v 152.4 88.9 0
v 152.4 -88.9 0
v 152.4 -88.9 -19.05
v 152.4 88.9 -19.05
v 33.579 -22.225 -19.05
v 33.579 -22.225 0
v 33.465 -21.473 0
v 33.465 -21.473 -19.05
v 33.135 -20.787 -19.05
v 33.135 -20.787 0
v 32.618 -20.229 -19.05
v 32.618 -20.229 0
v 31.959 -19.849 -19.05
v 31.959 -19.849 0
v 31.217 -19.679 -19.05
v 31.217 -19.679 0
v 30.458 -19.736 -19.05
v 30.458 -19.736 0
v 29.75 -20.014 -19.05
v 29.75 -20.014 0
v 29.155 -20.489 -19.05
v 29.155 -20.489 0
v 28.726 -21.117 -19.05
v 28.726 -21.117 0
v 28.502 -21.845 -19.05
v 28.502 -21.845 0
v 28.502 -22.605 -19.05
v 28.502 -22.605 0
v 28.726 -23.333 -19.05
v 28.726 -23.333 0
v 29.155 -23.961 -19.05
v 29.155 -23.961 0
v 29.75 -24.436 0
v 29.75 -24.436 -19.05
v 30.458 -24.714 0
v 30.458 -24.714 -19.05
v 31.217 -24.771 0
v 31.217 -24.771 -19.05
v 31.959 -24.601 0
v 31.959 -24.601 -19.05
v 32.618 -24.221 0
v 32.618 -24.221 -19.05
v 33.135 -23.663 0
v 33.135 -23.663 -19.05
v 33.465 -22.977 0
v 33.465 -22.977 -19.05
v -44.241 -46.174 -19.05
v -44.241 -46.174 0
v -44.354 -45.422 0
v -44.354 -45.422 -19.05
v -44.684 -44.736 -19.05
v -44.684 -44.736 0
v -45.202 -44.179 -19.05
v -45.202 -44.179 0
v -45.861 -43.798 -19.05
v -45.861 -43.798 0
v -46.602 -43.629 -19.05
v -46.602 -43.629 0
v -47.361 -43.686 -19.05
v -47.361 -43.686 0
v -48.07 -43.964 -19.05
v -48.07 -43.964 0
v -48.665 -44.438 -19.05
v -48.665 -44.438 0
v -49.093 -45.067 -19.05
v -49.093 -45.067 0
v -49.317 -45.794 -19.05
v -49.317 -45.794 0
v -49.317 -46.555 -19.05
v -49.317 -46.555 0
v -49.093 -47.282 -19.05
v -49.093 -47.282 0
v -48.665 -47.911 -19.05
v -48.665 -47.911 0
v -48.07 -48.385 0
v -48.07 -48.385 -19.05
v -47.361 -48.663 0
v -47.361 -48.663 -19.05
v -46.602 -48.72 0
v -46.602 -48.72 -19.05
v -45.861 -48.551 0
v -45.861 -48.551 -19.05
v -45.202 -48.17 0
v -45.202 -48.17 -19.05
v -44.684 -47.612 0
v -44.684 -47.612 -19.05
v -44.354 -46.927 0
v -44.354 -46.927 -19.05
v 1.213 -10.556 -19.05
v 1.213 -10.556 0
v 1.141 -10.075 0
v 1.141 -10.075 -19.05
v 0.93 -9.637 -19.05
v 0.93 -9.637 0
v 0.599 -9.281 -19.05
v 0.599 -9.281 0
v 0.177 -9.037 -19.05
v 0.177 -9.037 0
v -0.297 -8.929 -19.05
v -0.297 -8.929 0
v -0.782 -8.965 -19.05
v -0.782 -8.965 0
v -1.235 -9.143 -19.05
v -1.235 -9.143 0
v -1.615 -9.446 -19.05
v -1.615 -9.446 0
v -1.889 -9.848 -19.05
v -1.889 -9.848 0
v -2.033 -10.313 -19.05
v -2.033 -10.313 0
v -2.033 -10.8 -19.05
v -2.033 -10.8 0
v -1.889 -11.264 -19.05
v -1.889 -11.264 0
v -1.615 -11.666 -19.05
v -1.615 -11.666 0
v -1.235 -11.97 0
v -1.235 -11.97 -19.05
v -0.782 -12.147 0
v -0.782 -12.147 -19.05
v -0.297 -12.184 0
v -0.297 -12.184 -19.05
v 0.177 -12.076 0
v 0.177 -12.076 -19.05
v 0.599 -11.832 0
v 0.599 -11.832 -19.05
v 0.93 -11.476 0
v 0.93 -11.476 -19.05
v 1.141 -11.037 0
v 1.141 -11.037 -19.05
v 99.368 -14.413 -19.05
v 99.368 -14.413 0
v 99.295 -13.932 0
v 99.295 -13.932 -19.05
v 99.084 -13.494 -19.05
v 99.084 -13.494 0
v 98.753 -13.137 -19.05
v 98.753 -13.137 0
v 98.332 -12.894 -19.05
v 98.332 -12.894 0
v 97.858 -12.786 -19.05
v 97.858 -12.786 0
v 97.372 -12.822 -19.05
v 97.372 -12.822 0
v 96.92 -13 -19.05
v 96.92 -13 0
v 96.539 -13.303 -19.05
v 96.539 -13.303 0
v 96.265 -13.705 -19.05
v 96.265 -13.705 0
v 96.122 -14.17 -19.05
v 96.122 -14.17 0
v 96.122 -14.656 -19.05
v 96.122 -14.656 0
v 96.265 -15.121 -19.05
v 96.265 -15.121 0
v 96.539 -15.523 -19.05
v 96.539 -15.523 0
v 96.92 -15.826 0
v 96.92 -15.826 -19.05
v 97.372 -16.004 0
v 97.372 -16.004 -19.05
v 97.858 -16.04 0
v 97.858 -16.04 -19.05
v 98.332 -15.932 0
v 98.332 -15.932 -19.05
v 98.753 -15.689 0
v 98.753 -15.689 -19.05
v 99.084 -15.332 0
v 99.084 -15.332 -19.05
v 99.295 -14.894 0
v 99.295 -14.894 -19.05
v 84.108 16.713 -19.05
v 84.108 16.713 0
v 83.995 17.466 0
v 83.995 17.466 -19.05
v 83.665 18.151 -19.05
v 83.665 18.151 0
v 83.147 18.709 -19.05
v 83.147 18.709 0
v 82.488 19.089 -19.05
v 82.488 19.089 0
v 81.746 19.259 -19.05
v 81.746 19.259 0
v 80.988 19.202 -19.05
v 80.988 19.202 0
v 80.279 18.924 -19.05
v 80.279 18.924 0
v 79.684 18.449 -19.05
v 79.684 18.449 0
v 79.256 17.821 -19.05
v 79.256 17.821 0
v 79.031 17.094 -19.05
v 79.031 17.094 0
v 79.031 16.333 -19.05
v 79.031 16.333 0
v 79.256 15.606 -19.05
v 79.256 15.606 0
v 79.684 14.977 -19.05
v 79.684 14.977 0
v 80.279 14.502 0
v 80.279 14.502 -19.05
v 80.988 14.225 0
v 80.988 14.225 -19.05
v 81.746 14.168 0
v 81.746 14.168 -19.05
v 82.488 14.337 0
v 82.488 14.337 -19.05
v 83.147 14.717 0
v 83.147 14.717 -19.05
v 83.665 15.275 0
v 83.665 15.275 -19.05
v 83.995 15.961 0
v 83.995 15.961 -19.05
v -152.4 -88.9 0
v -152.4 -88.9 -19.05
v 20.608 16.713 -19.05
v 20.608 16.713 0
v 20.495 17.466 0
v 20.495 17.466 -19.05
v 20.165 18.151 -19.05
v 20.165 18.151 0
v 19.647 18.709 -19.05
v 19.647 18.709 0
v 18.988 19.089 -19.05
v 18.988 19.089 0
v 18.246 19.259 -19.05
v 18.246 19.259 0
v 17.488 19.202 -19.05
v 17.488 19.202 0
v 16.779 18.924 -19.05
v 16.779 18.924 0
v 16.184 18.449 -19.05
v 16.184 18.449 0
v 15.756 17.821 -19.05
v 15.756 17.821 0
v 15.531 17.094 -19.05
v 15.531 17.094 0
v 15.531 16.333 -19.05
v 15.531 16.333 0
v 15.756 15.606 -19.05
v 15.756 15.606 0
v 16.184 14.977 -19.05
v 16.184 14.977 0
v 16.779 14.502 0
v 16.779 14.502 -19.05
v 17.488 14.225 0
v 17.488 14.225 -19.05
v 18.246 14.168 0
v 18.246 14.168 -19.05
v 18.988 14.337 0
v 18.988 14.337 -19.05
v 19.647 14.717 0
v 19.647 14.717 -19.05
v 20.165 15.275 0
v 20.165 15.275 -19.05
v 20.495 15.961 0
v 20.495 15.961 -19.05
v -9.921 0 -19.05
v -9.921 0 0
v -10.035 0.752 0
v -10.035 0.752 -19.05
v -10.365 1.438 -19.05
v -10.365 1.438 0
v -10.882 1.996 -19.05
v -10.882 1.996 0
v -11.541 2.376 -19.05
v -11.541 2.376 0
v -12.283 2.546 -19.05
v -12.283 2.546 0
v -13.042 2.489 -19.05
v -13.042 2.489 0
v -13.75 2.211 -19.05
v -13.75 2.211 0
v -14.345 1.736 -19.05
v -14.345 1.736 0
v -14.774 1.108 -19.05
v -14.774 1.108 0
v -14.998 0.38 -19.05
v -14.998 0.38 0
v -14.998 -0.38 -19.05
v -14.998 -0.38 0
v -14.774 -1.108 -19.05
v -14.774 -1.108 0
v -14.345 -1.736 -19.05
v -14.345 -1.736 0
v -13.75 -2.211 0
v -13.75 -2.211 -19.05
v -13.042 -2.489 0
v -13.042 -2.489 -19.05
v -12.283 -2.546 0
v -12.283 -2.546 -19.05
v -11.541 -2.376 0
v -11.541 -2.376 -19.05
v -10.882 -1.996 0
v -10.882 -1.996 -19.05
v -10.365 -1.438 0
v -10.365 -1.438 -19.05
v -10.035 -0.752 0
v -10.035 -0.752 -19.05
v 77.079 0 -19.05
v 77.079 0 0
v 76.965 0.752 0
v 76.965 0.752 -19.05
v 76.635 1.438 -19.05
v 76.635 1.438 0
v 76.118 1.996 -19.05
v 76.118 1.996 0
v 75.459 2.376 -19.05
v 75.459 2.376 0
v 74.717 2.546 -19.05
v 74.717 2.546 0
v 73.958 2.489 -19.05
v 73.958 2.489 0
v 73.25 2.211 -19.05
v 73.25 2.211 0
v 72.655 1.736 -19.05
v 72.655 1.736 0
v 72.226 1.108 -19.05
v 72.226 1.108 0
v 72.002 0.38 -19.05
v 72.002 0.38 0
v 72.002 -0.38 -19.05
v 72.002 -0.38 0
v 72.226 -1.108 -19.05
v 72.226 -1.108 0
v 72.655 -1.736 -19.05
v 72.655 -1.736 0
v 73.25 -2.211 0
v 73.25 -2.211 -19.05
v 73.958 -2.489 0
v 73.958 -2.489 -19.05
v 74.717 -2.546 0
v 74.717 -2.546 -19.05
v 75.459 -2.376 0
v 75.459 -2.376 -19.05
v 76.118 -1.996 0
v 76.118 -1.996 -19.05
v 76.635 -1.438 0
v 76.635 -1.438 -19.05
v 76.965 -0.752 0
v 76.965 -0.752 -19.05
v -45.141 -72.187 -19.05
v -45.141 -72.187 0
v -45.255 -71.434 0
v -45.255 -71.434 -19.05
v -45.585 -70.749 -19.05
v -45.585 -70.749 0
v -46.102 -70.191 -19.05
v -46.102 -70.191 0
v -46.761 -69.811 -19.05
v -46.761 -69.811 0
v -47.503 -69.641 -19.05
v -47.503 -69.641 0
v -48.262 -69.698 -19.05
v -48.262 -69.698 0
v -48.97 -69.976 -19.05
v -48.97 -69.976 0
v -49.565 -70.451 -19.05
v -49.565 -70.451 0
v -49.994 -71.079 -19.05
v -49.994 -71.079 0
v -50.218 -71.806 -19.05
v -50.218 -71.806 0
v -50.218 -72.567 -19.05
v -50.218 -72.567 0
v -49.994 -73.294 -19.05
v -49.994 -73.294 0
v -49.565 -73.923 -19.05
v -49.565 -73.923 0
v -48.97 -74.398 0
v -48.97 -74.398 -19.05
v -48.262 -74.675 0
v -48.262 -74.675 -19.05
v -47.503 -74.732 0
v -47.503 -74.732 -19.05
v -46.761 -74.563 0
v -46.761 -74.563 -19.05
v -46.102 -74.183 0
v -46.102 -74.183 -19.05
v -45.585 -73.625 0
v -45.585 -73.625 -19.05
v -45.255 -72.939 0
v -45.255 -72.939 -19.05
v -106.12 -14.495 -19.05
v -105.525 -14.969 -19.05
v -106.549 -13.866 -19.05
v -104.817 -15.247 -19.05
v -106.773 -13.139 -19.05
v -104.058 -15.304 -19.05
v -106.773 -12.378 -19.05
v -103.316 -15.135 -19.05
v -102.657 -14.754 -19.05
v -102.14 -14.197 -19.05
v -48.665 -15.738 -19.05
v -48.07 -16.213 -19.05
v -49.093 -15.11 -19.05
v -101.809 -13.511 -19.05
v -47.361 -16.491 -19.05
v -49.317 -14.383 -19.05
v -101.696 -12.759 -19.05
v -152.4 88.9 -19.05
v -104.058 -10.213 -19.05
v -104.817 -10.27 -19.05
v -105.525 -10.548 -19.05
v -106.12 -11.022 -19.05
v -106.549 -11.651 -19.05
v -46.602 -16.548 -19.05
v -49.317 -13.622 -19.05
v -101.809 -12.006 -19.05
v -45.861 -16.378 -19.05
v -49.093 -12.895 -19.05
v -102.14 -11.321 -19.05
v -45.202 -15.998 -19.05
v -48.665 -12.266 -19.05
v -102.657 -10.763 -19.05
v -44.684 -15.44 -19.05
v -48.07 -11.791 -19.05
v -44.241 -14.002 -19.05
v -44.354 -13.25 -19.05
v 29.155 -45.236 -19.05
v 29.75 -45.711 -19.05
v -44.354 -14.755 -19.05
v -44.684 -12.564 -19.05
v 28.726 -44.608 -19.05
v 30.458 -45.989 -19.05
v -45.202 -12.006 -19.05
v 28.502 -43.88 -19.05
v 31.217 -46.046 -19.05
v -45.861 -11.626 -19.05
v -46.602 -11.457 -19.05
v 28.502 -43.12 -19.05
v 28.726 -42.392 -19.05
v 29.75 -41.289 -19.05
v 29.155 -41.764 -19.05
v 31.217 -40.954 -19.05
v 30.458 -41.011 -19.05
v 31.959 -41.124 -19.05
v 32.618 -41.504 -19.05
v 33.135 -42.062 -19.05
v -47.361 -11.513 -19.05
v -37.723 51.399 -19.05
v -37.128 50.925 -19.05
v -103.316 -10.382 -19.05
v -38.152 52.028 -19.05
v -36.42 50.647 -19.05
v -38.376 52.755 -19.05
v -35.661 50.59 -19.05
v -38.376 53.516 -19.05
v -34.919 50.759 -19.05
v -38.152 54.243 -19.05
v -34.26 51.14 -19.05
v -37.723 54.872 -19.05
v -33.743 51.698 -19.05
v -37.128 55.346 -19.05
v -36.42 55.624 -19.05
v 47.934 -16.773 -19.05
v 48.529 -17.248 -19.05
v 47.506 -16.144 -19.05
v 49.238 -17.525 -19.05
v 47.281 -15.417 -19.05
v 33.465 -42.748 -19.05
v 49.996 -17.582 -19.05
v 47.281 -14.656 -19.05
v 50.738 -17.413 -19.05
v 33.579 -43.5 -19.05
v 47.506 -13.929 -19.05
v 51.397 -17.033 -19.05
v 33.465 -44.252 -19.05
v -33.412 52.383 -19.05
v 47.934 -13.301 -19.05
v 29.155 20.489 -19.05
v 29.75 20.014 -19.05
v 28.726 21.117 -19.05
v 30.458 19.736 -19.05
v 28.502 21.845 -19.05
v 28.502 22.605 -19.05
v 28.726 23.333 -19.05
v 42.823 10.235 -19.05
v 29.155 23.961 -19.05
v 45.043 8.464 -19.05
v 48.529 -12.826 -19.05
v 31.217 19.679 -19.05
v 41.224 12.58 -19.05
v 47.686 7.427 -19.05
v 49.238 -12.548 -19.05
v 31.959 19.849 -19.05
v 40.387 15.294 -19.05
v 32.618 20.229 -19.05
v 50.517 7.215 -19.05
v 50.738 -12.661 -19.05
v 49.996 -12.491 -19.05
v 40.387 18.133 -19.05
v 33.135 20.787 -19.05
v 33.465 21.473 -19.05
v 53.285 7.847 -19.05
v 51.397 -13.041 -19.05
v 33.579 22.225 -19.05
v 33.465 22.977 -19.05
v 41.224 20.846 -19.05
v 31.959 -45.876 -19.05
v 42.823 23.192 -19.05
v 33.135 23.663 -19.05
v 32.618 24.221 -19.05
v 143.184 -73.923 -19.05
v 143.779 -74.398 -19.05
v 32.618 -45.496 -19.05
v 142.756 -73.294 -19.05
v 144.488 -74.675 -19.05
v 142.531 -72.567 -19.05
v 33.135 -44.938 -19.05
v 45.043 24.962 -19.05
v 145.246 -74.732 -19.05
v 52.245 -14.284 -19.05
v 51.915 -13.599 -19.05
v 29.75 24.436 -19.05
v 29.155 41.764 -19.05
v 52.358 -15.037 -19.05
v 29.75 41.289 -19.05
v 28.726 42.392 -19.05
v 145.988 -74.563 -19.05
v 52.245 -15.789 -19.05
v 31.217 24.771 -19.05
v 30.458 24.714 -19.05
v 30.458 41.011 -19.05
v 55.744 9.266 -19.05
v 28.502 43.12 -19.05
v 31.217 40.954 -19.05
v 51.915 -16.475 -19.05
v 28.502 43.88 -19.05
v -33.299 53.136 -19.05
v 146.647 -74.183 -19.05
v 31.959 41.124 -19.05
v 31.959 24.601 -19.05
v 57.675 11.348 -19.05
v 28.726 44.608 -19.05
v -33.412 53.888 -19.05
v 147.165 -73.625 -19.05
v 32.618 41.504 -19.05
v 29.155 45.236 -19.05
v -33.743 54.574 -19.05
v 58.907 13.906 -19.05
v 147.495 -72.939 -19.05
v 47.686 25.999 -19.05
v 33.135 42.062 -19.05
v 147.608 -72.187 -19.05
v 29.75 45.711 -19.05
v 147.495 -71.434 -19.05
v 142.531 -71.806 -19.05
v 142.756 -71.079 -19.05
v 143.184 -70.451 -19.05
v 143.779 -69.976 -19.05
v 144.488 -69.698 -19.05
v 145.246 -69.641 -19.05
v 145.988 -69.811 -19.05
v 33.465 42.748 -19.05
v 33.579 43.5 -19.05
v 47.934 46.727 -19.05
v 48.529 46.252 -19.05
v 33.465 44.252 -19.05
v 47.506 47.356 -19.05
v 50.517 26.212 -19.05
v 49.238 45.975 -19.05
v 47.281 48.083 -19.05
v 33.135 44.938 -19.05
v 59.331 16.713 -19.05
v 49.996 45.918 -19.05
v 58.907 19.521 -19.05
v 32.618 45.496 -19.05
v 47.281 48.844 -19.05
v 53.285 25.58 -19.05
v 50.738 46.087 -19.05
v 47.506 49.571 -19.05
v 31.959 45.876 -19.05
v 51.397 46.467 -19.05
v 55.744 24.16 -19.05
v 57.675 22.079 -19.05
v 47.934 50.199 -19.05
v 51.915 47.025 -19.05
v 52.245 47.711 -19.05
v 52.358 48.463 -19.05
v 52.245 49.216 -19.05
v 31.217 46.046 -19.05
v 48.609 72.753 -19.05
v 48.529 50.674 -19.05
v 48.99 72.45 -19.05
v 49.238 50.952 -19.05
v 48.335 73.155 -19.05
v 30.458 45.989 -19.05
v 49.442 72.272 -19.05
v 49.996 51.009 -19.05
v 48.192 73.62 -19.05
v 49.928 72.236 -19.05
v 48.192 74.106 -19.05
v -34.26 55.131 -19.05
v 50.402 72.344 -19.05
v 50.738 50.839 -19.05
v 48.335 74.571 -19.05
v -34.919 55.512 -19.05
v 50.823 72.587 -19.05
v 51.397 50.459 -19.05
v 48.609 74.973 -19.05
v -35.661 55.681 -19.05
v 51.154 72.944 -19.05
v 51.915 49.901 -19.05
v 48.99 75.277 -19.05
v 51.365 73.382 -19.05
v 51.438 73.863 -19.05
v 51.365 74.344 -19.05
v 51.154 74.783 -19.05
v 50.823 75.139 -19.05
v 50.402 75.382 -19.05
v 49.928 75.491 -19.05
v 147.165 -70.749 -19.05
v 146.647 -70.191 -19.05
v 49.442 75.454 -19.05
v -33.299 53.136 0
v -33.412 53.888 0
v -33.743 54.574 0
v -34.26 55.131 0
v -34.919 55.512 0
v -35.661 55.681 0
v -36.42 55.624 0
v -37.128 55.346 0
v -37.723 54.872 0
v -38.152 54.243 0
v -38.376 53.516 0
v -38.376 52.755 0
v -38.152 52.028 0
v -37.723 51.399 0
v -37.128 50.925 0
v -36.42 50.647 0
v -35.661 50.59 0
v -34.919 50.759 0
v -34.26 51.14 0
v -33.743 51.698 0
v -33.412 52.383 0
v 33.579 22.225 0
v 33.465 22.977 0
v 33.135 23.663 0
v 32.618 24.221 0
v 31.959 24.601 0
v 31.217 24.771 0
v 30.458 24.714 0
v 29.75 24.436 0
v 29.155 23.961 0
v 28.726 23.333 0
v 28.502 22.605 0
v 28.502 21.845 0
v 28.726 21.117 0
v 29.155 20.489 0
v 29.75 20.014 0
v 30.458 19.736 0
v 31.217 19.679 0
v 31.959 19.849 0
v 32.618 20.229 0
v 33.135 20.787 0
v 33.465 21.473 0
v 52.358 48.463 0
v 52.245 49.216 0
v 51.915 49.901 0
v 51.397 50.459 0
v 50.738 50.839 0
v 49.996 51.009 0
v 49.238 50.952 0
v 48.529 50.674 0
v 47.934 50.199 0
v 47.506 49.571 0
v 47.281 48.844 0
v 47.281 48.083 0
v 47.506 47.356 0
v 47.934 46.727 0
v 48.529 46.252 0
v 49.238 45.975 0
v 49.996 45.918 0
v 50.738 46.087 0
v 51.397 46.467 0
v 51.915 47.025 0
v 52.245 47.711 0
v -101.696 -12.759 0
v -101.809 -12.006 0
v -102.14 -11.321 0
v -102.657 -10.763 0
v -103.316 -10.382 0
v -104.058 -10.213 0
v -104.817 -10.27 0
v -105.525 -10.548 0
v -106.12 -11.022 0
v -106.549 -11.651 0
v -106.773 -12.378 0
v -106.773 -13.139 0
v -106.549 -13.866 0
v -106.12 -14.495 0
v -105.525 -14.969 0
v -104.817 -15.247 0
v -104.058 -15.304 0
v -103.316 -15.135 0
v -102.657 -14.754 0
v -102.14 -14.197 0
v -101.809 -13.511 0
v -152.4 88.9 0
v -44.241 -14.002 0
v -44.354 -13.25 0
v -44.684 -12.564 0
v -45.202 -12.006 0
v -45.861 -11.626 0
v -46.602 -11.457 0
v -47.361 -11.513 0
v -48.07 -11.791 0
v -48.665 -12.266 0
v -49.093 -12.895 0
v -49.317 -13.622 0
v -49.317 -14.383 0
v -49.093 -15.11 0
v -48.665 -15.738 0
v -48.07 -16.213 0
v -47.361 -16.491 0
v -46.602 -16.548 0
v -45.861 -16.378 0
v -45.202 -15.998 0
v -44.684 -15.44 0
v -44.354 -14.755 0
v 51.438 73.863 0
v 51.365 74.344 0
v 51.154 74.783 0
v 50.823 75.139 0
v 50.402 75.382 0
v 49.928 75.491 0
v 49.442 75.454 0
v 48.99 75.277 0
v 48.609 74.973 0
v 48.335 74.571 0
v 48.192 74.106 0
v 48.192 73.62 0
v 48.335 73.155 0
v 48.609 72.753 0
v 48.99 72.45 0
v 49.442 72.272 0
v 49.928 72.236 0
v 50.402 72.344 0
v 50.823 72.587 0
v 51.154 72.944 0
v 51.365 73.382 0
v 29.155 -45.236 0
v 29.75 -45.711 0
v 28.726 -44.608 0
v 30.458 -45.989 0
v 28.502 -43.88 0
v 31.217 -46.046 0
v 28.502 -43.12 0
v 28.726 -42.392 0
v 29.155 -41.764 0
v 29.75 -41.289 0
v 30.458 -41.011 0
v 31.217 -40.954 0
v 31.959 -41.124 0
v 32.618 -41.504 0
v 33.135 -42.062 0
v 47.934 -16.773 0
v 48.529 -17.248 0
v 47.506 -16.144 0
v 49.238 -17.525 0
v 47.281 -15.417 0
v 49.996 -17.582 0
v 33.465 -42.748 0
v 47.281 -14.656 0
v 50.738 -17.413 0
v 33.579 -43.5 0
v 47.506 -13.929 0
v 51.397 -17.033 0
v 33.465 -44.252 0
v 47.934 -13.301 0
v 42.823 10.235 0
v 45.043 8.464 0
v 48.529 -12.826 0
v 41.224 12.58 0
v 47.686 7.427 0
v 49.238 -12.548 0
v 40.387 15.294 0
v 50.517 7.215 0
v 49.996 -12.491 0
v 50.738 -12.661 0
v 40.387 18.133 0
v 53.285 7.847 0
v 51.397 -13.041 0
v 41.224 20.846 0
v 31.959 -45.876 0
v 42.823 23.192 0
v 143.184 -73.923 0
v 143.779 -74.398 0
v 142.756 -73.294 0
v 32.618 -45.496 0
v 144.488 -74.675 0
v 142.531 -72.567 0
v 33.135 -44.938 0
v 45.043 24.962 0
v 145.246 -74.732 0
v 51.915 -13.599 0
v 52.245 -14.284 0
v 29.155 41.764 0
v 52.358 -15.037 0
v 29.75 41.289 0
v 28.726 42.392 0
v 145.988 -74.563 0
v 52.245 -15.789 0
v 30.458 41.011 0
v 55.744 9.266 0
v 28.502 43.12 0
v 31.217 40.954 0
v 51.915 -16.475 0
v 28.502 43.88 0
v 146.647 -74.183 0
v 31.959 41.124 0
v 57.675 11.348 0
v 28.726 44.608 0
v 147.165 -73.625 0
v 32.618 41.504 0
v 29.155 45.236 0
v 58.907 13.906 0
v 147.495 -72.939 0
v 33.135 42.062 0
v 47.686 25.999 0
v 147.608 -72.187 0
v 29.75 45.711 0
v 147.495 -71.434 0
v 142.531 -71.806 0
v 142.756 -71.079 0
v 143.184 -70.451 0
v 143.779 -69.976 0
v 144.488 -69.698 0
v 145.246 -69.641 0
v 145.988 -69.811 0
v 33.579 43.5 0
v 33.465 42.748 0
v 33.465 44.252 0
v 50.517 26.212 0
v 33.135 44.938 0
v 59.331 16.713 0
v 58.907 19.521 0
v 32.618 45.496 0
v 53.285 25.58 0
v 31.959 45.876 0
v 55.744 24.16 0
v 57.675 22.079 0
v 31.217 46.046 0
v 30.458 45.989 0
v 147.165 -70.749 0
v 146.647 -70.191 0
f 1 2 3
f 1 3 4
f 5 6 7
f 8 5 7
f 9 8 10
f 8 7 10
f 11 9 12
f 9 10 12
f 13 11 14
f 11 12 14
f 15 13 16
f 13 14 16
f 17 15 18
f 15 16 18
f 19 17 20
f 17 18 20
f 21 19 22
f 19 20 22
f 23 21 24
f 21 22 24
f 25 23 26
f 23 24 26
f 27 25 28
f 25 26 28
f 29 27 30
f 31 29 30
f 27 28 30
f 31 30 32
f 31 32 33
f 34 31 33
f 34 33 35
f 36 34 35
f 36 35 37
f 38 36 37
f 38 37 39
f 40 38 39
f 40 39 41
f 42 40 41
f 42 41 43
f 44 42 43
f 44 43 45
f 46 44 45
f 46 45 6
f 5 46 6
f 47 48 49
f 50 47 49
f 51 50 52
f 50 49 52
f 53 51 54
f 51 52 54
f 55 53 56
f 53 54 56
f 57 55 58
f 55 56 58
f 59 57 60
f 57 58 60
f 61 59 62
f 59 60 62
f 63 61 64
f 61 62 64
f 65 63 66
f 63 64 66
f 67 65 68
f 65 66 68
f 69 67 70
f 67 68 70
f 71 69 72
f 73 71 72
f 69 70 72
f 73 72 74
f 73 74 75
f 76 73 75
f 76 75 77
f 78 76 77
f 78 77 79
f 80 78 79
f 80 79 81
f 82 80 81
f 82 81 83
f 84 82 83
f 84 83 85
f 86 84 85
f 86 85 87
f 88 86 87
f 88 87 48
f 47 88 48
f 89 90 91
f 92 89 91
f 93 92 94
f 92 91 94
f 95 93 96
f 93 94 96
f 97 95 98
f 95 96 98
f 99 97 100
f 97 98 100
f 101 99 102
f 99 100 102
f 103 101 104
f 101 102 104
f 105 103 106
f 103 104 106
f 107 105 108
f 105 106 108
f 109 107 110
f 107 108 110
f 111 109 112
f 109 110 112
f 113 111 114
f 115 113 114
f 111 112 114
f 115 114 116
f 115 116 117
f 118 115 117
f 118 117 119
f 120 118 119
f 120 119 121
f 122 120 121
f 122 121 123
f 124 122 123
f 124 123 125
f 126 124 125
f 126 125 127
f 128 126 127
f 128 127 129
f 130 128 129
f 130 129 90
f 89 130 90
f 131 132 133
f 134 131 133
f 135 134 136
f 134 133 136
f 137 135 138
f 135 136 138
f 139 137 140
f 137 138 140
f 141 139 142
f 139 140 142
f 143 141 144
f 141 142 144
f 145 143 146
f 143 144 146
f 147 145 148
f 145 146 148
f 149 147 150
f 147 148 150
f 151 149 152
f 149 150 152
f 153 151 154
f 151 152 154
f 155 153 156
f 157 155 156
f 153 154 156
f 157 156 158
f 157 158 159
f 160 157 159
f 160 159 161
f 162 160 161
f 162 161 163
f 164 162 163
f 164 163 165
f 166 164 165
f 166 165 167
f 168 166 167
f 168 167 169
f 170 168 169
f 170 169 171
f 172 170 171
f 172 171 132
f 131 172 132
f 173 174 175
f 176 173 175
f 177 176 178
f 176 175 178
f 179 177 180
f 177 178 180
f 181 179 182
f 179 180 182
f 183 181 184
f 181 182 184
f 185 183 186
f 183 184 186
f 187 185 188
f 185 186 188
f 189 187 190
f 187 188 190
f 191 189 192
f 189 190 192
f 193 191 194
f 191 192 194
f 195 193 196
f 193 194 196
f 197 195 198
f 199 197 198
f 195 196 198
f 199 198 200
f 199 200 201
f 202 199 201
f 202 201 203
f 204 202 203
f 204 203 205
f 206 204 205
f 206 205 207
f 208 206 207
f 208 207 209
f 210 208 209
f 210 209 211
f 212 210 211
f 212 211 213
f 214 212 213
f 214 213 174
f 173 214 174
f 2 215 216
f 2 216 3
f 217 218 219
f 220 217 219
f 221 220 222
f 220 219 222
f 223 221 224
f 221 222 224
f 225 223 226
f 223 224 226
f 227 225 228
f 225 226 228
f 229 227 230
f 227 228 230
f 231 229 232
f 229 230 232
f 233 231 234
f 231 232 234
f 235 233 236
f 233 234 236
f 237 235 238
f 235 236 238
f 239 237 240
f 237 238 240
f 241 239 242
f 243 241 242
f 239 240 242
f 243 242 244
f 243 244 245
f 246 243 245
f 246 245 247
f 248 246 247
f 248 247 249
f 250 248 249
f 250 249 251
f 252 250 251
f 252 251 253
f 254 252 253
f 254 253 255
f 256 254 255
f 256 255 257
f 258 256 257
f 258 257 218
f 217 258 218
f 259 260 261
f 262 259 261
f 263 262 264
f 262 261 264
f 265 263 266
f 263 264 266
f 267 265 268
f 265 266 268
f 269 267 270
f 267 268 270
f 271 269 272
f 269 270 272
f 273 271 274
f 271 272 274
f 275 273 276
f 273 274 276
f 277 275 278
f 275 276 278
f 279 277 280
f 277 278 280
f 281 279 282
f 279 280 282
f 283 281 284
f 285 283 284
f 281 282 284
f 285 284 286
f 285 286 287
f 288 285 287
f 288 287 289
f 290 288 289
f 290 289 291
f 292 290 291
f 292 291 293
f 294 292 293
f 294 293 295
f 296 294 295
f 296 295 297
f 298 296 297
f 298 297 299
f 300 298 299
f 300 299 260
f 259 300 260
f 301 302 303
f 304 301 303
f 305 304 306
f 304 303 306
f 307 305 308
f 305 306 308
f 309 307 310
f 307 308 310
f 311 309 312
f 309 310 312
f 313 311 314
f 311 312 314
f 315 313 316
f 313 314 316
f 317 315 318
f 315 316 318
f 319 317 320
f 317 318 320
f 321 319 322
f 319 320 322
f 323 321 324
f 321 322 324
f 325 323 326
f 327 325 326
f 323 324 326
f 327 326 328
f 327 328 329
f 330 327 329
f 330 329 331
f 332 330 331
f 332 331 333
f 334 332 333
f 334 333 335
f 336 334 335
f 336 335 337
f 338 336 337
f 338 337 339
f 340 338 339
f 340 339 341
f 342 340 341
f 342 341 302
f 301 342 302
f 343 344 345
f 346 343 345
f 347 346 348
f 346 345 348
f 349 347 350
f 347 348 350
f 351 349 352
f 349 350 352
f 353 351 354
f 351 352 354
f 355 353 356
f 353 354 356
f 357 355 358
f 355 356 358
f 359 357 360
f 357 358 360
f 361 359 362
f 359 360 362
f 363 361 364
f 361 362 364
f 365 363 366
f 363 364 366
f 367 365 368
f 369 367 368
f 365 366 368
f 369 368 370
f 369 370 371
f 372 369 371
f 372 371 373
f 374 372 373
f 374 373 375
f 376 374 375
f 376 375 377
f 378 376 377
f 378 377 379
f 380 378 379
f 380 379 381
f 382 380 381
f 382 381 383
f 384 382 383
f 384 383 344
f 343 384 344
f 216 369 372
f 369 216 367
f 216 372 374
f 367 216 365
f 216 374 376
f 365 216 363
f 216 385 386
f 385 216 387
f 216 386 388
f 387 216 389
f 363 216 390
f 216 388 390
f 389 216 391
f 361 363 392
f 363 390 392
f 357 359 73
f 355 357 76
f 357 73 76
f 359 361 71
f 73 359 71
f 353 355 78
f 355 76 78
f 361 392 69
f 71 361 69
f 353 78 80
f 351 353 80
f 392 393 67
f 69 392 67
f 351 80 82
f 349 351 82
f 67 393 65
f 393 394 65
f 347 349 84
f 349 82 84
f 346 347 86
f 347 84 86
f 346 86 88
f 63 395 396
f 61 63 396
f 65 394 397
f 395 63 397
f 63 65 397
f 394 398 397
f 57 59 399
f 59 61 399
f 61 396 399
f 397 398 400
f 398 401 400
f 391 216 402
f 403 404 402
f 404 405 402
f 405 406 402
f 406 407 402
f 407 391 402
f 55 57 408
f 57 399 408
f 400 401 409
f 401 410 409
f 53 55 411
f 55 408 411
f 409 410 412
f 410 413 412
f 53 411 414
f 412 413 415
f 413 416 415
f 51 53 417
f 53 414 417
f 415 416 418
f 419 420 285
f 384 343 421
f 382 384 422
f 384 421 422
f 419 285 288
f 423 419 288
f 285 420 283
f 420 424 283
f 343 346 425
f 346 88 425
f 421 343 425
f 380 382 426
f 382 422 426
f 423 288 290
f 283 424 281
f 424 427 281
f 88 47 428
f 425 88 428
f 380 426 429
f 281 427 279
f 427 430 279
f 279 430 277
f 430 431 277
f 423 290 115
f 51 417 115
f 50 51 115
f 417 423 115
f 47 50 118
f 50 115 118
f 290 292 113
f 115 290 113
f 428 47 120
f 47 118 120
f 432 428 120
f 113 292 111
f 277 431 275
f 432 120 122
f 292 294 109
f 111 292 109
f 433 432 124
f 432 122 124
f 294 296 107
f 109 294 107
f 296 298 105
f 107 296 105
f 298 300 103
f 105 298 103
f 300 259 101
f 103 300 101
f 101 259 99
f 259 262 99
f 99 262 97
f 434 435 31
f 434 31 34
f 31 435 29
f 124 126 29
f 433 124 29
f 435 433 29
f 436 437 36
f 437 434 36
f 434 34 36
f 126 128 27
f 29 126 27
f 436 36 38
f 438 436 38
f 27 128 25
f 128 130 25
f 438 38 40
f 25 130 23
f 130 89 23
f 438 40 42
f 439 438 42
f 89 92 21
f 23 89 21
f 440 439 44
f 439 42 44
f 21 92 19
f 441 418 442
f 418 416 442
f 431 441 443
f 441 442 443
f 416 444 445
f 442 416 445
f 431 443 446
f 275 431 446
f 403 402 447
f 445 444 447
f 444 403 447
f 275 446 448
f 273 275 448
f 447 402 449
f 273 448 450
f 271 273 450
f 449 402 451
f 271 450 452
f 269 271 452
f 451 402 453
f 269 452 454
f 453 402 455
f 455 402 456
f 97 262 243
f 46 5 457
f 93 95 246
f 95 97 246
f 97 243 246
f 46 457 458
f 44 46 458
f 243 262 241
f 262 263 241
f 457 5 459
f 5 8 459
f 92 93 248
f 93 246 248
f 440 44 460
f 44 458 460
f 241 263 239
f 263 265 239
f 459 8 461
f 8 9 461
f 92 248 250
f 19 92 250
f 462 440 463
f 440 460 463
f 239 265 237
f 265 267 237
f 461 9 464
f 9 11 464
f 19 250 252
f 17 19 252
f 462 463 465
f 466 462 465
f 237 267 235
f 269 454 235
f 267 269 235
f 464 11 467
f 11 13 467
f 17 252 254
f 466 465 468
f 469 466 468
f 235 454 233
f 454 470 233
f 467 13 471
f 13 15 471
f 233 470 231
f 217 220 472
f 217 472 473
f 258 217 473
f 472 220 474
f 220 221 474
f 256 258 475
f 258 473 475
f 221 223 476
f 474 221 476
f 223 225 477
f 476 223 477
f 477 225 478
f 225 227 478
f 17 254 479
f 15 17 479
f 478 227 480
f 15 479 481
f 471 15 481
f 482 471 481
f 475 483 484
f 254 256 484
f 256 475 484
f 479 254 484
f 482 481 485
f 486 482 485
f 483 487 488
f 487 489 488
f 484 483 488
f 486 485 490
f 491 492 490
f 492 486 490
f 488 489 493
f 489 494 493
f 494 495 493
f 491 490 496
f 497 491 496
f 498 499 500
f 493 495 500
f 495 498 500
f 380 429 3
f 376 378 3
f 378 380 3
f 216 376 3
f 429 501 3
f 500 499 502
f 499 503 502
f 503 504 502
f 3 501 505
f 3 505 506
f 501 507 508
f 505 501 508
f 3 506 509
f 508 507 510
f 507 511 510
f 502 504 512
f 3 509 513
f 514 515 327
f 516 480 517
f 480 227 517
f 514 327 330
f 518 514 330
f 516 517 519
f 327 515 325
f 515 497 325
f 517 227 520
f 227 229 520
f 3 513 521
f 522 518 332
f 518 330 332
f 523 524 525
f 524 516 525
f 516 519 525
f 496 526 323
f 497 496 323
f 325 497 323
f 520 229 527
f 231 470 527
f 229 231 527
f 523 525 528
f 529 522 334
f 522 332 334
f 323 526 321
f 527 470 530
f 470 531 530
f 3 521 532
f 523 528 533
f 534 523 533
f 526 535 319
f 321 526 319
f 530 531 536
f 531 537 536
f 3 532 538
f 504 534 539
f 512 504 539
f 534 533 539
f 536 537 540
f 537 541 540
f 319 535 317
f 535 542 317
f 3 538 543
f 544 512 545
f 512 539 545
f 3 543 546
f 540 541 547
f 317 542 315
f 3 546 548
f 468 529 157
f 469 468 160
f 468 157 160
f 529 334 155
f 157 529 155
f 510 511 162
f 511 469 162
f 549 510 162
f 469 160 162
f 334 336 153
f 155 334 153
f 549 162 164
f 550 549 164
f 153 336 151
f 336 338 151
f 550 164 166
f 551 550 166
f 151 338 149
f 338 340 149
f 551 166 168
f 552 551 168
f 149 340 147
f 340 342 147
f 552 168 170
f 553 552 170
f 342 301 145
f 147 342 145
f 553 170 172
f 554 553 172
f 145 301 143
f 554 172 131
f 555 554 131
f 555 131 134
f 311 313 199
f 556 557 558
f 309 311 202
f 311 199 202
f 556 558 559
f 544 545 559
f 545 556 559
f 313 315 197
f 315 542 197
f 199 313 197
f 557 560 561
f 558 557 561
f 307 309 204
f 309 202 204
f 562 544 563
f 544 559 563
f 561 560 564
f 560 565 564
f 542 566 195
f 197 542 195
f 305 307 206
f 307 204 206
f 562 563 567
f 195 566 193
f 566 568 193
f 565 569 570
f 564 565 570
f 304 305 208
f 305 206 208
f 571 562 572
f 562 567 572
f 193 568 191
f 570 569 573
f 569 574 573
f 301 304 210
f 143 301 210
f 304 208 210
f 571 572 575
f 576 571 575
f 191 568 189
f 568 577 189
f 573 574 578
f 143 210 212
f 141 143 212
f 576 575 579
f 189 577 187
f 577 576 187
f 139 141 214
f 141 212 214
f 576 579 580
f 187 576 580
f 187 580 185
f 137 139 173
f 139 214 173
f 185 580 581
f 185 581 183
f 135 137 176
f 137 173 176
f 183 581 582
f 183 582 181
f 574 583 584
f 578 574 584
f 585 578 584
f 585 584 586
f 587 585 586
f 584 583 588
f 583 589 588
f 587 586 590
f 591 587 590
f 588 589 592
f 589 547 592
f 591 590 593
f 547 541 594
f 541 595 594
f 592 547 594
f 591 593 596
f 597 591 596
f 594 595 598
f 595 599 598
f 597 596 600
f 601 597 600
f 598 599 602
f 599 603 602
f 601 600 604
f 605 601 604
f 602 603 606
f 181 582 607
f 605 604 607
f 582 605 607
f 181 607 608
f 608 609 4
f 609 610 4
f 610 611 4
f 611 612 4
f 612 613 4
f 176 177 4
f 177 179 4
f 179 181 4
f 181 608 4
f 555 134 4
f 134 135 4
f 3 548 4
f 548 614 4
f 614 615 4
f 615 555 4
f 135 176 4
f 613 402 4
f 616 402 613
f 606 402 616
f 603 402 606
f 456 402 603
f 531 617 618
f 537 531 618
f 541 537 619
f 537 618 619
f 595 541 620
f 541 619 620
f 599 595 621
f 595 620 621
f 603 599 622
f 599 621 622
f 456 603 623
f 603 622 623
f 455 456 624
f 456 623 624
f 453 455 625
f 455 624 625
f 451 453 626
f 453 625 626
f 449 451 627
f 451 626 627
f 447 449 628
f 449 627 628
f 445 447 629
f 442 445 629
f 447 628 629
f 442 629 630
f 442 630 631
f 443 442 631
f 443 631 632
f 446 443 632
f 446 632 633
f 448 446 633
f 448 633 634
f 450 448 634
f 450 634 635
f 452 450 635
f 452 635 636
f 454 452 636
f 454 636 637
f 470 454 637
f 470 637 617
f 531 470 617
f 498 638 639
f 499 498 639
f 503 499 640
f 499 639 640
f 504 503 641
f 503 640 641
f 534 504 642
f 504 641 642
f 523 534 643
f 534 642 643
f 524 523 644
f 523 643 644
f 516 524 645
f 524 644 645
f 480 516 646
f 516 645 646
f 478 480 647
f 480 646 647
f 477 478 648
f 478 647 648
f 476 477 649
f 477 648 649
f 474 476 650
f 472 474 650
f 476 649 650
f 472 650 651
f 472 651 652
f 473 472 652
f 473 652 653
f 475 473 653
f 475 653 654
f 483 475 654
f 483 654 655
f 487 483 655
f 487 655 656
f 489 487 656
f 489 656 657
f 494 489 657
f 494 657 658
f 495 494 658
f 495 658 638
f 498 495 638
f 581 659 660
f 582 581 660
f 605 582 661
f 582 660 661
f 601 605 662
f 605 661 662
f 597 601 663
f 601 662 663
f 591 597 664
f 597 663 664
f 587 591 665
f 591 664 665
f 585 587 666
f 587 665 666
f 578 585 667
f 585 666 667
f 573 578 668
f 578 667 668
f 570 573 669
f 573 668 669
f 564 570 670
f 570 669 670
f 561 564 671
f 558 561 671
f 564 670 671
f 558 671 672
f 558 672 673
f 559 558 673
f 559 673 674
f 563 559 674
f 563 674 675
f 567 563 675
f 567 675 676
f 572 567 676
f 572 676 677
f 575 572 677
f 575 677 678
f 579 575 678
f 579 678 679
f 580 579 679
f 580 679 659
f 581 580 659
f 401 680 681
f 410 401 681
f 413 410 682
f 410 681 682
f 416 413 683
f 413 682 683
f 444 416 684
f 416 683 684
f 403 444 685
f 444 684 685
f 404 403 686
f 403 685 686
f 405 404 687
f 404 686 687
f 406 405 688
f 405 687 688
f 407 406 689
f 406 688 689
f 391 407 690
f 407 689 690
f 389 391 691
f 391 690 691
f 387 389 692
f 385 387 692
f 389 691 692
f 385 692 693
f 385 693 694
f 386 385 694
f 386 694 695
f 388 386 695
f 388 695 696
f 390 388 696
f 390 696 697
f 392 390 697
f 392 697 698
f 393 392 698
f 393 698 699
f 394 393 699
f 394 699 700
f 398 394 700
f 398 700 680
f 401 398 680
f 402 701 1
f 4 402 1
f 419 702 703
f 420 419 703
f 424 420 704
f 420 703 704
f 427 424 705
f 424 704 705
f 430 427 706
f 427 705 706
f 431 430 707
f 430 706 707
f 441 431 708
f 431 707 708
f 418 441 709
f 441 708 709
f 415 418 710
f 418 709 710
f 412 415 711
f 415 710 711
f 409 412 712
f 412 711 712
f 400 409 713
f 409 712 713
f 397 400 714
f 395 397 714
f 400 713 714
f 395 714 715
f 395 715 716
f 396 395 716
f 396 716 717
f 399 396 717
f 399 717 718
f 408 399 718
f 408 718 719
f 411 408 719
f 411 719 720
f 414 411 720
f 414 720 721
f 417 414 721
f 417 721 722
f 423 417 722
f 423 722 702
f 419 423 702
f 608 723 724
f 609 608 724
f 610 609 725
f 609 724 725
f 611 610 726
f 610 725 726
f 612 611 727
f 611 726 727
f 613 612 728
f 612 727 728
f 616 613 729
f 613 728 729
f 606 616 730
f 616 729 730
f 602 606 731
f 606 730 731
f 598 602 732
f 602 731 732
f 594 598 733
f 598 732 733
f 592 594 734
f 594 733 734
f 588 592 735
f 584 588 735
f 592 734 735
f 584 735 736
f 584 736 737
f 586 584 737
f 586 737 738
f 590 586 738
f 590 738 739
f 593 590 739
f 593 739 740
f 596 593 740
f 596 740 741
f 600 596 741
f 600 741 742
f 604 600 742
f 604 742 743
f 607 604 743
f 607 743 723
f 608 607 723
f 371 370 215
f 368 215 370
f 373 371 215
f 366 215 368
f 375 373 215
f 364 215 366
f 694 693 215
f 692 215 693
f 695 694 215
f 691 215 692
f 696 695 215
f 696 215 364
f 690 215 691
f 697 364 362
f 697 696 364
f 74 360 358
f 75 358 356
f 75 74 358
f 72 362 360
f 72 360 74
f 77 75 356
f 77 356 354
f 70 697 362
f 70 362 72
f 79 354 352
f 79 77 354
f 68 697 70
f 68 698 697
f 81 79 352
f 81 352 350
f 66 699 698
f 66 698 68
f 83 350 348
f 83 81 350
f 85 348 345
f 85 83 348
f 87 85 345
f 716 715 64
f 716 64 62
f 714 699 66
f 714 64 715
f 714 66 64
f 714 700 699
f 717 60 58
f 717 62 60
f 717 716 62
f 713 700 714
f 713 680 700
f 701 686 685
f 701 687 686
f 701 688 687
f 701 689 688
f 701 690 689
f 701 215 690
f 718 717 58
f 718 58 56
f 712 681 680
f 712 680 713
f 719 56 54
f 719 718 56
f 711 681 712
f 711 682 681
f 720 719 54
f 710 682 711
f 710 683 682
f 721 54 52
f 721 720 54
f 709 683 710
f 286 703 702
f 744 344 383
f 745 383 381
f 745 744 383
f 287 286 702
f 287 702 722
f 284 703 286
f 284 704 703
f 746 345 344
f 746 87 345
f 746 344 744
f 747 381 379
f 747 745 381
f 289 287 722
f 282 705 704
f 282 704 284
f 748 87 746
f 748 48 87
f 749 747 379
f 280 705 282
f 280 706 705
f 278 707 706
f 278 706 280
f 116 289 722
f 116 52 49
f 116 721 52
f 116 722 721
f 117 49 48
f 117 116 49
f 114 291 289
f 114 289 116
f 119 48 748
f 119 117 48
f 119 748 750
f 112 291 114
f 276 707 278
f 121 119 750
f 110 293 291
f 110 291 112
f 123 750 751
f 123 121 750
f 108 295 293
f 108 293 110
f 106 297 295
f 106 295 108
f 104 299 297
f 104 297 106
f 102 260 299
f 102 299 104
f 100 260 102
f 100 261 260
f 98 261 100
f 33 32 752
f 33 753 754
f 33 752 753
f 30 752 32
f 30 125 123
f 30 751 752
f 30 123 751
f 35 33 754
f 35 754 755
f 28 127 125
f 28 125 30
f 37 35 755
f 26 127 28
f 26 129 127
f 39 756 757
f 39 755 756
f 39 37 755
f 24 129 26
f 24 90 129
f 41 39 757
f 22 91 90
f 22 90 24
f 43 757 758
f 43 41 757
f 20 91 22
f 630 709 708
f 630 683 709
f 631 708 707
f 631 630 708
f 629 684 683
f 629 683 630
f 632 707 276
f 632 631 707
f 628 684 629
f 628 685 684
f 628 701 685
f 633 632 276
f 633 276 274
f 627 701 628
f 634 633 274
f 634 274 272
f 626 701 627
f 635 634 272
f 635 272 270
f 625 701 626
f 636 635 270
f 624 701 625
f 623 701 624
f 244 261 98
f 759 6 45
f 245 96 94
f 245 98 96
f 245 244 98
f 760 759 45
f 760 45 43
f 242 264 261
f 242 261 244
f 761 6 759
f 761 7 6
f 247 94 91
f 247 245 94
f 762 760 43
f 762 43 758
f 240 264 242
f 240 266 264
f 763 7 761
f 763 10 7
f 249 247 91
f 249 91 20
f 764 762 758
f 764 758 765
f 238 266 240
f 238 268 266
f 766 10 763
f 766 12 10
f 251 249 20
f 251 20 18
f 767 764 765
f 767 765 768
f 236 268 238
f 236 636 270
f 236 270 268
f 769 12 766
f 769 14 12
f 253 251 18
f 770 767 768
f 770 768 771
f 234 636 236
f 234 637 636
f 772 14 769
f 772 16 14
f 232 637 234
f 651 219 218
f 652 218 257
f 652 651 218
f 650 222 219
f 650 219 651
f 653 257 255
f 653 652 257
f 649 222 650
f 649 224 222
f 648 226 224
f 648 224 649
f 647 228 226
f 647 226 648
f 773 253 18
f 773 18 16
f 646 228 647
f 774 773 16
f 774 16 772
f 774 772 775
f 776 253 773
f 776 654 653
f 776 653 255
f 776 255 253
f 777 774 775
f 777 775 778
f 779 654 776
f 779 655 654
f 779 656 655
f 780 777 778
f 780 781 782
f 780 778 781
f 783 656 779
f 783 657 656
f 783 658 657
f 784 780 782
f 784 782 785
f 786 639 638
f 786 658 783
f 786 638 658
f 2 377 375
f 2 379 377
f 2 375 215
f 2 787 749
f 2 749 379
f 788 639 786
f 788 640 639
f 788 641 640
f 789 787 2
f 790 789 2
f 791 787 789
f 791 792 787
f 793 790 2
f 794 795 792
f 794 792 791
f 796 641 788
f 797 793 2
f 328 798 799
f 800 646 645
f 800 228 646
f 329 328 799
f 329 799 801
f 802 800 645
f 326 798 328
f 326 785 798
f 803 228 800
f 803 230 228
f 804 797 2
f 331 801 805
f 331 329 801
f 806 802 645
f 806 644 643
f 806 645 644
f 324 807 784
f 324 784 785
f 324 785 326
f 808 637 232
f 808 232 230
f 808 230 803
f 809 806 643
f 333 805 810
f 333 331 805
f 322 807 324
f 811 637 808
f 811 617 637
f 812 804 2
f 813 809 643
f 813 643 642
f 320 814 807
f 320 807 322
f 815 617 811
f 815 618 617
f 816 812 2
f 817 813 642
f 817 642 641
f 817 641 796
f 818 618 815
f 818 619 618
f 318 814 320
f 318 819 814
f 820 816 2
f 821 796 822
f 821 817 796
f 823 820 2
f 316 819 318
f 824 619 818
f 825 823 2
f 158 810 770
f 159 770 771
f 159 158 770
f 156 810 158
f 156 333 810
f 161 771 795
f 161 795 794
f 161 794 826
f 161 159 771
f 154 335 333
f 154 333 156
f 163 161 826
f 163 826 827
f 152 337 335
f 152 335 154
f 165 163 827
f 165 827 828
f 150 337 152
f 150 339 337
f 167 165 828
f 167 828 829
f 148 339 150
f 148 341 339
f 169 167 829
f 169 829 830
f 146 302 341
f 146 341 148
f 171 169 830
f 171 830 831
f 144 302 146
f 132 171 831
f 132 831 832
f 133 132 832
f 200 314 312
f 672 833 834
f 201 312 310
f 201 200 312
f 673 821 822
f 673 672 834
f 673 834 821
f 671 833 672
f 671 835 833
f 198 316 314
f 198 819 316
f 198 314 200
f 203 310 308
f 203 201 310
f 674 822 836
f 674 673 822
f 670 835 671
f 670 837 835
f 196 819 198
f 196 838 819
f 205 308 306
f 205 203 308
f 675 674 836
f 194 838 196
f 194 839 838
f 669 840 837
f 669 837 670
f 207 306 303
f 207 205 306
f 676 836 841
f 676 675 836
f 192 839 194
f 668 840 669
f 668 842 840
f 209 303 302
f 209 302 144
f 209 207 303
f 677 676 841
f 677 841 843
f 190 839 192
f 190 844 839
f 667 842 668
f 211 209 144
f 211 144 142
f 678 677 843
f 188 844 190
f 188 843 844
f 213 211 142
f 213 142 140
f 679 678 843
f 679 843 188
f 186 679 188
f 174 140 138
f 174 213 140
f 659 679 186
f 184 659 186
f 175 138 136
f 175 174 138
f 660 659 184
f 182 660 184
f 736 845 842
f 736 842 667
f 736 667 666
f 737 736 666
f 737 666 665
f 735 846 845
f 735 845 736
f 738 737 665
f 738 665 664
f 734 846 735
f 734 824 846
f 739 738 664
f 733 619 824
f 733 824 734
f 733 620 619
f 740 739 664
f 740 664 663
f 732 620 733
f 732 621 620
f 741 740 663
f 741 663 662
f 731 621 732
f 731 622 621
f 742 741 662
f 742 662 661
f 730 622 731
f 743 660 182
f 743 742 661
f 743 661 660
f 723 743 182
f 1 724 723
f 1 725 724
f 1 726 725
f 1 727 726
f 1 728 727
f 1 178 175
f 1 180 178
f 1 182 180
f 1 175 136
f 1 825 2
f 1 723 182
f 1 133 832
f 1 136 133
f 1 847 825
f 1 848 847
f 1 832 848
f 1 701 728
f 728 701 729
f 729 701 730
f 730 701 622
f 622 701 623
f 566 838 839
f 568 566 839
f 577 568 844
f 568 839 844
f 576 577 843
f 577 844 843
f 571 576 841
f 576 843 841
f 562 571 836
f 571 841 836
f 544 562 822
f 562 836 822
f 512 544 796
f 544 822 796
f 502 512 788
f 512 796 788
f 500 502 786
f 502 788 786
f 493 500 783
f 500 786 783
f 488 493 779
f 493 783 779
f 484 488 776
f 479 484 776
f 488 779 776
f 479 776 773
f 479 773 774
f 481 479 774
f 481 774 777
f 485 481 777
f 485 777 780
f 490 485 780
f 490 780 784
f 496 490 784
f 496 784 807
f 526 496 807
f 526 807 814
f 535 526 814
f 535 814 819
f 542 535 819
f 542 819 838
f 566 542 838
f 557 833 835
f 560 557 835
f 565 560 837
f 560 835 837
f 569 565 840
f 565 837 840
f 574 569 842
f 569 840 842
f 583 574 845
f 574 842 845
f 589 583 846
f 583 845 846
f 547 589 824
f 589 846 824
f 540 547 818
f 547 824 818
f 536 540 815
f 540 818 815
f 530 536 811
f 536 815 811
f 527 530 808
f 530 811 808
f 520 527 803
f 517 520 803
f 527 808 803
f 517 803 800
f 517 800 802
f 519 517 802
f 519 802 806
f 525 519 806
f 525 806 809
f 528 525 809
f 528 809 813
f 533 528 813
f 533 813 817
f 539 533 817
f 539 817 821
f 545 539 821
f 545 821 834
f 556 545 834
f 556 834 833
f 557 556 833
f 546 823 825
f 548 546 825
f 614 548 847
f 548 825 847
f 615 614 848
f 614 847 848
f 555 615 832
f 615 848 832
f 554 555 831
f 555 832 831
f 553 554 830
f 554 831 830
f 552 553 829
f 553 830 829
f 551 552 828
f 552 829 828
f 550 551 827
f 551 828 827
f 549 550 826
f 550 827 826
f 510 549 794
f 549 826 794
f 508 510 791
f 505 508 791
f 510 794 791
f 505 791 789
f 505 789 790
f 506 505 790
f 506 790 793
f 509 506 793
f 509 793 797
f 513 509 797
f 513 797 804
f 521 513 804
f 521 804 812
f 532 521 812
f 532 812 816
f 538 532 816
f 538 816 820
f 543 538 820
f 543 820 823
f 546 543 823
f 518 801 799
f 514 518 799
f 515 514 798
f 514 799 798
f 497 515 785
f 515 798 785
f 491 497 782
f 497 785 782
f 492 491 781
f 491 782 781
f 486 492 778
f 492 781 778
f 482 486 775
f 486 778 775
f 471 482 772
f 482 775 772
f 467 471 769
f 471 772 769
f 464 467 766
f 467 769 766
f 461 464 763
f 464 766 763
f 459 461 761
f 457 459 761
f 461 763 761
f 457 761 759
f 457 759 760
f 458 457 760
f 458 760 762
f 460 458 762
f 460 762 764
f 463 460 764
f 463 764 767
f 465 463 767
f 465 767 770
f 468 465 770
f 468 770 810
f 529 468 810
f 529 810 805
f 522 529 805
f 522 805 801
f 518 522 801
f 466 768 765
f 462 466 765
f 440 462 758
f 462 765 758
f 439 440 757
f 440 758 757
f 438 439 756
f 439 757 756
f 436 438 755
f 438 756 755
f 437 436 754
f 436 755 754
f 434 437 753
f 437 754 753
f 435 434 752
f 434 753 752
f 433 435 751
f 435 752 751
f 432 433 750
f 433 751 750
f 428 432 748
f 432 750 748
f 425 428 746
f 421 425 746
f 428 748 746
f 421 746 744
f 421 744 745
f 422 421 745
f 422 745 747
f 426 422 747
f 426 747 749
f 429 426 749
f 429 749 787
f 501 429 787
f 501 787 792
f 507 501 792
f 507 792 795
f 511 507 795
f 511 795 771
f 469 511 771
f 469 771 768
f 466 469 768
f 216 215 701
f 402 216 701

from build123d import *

# Parameters (mm, degrees)
SKETCH1_W           = 304.8
SKETCH1_H           = 177.8
BOSS_EXTRUDE1_DEPTH = 19.05
SKETCH2_R           = 2.5527
SKETCH2_R_2         = 1.63195
SKETCH2_R_3         = 9.525
CUT_EXTRUDE1_DEPTH  = 178.459495379
SKETCH10_R          = 2.5527
CUT_EXTRUDE2_DEPTH  = 178.459495379


with BuildPart() as part:
    # Sketch1 → Boss-Extrude1 (new body)
    with BuildSketch(Plane.XY):
        Rectangle(SKETCH1_W, SKETCH1_H)
    extrude(amount=-BOSS_EXTRUDE1_DEPTH)

    # Sketch2 → Cut-Extrude1 (cut, through all)
    with BuildSketch(Plane.XY):
        with Locations((-104.248655176, -12.758541966)):
            Circle(SKETCH2_R)
        with Locations((-46.793240461, -46.174477312)):
            Circle(SKETCH2_R)
        with Locations((18.05555, 16.7132)):
            Circle(SKETCH2_R)
        with Locations((-35.851762373, 53.135528594)):
            Circle(SKETCH2_R)
        with Locations((-47.693929175, -72.1868)):
            Circle(SKETCH2_R)
        with Locations((49.80555, 48.4632)):
            Circle(SKETCH2_R)
        with Locations((81.55555, 16.7132)):
            Circle(SKETCH2_R)
        with Locations((49.80555, -15.0368)):
            Circle(SKETCH2_R)
        with Locations((-46.793240461, -14.002181532)):
            Circle(SKETCH2_R)
        with Locations((49.80555, 73.8632)):
            Circle(SKETCH2_R_2)
        with Locations((145.05555, -72.1868)):
            Circle(SKETCH2_R)
        with Locations((-0.418847989, -10.556423149)):
            Circle(SKETCH2_R_2)
        with Locations((97.735572958, -14.412920851)):
            Circle(SKETCH2_R_2)
        with Locations((49.80555, 16.7132)):
            Circle(SKETCH2_R_3)
    extrude(amount=-CUT_EXTRUDE1_DEPTH, mode=Mode.SUBTRACT)

    # Sketch10 → Cut-Extrude2 (cut, through all)
    with BuildSketch(Plane.XY):
        with Locations((-12.473887774, 0)):
            Circle(SKETCH10_R)
        with Locations((31.026112348, -43.500000122)):
            Circle(SKETCH10_R)
        with Locations((74.52611247, 0)):
            Circle(SKETCH10_R)
        with Locations((31.026112348, 43.500000122)):
            Circle(SKETCH10_R)
        with Locations((31.026112348, 22.225)):
            Circle(SKETCH10_R)
        with Locations((31.026112348, -22.225)):
            Circle(SKETCH10_R)
    extrude(amount=-CUT_EXTRUDE2_DEPTH, mode=Mode.SUBTRACT)


solid = part.part
